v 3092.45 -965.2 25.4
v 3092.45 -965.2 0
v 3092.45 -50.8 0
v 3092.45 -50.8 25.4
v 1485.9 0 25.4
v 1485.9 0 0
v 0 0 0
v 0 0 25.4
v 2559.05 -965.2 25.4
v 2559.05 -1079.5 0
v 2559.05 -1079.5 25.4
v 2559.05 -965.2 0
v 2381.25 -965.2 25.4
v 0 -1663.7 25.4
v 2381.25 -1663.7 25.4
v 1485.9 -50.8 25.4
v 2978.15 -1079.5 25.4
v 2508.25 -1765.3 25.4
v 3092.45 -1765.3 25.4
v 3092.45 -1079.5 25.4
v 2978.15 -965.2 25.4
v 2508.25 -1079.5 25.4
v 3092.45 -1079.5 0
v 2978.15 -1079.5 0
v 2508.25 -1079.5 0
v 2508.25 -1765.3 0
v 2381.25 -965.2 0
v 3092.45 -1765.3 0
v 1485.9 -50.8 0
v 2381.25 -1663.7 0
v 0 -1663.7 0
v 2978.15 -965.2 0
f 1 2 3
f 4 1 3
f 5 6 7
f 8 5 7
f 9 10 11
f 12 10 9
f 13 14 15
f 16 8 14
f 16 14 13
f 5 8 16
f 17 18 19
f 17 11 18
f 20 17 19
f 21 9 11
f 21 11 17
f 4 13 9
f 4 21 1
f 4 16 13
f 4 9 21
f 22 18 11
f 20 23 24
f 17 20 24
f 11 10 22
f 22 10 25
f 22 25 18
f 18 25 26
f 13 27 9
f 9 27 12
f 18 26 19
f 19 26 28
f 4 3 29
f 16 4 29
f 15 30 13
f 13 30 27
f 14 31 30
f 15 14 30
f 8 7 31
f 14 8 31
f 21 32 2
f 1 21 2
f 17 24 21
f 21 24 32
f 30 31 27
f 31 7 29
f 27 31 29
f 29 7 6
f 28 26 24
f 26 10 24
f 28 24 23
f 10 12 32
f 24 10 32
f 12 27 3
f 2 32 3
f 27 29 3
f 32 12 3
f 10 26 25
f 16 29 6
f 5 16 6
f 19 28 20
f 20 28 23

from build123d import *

# Parameters (mm, degrees)
F0_W     = 895.35
F0_H     = 698.5
F0_W_2   = 419.1
F0_H_2   = 114.3
F1_DEPTH = 25.4


with BuildPart() as f1:
    # F0 (on Top) → F1 (new body)
    with BuildSketch(Plane.XY):
        Polygon((1485.9, 0), (0, 0), (0, -1663.7), (1485.9, -1663.7), (1485.9, -965.2), (1485.9, -50.8), align=None)
        Polygon((3092.45, -50.8), (1485.9, -50.8), (1485.9, -965.2), (2381.25, -965.2), (2559.05, -965.2), (2978.15, -965.2), (3092.45, -965.2), align=None)
        with Locations((1933.575, -1314.45)):
            Rectangle(F0_W, F0_H)
        Polygon((2978.15, -1079.5), (2559.05, -1079.5), (2508.25, -1079.5), (2508.25, -1765.3), (3092.45, -1765.3), (3092.45, -1079.5), align=None)
        with Locations((2768.6, -1022.35)):
            Rectangle(F0_W_2, F0_H_2)
    extrude(amount=F1_DEPTH)


solid = f1.part
